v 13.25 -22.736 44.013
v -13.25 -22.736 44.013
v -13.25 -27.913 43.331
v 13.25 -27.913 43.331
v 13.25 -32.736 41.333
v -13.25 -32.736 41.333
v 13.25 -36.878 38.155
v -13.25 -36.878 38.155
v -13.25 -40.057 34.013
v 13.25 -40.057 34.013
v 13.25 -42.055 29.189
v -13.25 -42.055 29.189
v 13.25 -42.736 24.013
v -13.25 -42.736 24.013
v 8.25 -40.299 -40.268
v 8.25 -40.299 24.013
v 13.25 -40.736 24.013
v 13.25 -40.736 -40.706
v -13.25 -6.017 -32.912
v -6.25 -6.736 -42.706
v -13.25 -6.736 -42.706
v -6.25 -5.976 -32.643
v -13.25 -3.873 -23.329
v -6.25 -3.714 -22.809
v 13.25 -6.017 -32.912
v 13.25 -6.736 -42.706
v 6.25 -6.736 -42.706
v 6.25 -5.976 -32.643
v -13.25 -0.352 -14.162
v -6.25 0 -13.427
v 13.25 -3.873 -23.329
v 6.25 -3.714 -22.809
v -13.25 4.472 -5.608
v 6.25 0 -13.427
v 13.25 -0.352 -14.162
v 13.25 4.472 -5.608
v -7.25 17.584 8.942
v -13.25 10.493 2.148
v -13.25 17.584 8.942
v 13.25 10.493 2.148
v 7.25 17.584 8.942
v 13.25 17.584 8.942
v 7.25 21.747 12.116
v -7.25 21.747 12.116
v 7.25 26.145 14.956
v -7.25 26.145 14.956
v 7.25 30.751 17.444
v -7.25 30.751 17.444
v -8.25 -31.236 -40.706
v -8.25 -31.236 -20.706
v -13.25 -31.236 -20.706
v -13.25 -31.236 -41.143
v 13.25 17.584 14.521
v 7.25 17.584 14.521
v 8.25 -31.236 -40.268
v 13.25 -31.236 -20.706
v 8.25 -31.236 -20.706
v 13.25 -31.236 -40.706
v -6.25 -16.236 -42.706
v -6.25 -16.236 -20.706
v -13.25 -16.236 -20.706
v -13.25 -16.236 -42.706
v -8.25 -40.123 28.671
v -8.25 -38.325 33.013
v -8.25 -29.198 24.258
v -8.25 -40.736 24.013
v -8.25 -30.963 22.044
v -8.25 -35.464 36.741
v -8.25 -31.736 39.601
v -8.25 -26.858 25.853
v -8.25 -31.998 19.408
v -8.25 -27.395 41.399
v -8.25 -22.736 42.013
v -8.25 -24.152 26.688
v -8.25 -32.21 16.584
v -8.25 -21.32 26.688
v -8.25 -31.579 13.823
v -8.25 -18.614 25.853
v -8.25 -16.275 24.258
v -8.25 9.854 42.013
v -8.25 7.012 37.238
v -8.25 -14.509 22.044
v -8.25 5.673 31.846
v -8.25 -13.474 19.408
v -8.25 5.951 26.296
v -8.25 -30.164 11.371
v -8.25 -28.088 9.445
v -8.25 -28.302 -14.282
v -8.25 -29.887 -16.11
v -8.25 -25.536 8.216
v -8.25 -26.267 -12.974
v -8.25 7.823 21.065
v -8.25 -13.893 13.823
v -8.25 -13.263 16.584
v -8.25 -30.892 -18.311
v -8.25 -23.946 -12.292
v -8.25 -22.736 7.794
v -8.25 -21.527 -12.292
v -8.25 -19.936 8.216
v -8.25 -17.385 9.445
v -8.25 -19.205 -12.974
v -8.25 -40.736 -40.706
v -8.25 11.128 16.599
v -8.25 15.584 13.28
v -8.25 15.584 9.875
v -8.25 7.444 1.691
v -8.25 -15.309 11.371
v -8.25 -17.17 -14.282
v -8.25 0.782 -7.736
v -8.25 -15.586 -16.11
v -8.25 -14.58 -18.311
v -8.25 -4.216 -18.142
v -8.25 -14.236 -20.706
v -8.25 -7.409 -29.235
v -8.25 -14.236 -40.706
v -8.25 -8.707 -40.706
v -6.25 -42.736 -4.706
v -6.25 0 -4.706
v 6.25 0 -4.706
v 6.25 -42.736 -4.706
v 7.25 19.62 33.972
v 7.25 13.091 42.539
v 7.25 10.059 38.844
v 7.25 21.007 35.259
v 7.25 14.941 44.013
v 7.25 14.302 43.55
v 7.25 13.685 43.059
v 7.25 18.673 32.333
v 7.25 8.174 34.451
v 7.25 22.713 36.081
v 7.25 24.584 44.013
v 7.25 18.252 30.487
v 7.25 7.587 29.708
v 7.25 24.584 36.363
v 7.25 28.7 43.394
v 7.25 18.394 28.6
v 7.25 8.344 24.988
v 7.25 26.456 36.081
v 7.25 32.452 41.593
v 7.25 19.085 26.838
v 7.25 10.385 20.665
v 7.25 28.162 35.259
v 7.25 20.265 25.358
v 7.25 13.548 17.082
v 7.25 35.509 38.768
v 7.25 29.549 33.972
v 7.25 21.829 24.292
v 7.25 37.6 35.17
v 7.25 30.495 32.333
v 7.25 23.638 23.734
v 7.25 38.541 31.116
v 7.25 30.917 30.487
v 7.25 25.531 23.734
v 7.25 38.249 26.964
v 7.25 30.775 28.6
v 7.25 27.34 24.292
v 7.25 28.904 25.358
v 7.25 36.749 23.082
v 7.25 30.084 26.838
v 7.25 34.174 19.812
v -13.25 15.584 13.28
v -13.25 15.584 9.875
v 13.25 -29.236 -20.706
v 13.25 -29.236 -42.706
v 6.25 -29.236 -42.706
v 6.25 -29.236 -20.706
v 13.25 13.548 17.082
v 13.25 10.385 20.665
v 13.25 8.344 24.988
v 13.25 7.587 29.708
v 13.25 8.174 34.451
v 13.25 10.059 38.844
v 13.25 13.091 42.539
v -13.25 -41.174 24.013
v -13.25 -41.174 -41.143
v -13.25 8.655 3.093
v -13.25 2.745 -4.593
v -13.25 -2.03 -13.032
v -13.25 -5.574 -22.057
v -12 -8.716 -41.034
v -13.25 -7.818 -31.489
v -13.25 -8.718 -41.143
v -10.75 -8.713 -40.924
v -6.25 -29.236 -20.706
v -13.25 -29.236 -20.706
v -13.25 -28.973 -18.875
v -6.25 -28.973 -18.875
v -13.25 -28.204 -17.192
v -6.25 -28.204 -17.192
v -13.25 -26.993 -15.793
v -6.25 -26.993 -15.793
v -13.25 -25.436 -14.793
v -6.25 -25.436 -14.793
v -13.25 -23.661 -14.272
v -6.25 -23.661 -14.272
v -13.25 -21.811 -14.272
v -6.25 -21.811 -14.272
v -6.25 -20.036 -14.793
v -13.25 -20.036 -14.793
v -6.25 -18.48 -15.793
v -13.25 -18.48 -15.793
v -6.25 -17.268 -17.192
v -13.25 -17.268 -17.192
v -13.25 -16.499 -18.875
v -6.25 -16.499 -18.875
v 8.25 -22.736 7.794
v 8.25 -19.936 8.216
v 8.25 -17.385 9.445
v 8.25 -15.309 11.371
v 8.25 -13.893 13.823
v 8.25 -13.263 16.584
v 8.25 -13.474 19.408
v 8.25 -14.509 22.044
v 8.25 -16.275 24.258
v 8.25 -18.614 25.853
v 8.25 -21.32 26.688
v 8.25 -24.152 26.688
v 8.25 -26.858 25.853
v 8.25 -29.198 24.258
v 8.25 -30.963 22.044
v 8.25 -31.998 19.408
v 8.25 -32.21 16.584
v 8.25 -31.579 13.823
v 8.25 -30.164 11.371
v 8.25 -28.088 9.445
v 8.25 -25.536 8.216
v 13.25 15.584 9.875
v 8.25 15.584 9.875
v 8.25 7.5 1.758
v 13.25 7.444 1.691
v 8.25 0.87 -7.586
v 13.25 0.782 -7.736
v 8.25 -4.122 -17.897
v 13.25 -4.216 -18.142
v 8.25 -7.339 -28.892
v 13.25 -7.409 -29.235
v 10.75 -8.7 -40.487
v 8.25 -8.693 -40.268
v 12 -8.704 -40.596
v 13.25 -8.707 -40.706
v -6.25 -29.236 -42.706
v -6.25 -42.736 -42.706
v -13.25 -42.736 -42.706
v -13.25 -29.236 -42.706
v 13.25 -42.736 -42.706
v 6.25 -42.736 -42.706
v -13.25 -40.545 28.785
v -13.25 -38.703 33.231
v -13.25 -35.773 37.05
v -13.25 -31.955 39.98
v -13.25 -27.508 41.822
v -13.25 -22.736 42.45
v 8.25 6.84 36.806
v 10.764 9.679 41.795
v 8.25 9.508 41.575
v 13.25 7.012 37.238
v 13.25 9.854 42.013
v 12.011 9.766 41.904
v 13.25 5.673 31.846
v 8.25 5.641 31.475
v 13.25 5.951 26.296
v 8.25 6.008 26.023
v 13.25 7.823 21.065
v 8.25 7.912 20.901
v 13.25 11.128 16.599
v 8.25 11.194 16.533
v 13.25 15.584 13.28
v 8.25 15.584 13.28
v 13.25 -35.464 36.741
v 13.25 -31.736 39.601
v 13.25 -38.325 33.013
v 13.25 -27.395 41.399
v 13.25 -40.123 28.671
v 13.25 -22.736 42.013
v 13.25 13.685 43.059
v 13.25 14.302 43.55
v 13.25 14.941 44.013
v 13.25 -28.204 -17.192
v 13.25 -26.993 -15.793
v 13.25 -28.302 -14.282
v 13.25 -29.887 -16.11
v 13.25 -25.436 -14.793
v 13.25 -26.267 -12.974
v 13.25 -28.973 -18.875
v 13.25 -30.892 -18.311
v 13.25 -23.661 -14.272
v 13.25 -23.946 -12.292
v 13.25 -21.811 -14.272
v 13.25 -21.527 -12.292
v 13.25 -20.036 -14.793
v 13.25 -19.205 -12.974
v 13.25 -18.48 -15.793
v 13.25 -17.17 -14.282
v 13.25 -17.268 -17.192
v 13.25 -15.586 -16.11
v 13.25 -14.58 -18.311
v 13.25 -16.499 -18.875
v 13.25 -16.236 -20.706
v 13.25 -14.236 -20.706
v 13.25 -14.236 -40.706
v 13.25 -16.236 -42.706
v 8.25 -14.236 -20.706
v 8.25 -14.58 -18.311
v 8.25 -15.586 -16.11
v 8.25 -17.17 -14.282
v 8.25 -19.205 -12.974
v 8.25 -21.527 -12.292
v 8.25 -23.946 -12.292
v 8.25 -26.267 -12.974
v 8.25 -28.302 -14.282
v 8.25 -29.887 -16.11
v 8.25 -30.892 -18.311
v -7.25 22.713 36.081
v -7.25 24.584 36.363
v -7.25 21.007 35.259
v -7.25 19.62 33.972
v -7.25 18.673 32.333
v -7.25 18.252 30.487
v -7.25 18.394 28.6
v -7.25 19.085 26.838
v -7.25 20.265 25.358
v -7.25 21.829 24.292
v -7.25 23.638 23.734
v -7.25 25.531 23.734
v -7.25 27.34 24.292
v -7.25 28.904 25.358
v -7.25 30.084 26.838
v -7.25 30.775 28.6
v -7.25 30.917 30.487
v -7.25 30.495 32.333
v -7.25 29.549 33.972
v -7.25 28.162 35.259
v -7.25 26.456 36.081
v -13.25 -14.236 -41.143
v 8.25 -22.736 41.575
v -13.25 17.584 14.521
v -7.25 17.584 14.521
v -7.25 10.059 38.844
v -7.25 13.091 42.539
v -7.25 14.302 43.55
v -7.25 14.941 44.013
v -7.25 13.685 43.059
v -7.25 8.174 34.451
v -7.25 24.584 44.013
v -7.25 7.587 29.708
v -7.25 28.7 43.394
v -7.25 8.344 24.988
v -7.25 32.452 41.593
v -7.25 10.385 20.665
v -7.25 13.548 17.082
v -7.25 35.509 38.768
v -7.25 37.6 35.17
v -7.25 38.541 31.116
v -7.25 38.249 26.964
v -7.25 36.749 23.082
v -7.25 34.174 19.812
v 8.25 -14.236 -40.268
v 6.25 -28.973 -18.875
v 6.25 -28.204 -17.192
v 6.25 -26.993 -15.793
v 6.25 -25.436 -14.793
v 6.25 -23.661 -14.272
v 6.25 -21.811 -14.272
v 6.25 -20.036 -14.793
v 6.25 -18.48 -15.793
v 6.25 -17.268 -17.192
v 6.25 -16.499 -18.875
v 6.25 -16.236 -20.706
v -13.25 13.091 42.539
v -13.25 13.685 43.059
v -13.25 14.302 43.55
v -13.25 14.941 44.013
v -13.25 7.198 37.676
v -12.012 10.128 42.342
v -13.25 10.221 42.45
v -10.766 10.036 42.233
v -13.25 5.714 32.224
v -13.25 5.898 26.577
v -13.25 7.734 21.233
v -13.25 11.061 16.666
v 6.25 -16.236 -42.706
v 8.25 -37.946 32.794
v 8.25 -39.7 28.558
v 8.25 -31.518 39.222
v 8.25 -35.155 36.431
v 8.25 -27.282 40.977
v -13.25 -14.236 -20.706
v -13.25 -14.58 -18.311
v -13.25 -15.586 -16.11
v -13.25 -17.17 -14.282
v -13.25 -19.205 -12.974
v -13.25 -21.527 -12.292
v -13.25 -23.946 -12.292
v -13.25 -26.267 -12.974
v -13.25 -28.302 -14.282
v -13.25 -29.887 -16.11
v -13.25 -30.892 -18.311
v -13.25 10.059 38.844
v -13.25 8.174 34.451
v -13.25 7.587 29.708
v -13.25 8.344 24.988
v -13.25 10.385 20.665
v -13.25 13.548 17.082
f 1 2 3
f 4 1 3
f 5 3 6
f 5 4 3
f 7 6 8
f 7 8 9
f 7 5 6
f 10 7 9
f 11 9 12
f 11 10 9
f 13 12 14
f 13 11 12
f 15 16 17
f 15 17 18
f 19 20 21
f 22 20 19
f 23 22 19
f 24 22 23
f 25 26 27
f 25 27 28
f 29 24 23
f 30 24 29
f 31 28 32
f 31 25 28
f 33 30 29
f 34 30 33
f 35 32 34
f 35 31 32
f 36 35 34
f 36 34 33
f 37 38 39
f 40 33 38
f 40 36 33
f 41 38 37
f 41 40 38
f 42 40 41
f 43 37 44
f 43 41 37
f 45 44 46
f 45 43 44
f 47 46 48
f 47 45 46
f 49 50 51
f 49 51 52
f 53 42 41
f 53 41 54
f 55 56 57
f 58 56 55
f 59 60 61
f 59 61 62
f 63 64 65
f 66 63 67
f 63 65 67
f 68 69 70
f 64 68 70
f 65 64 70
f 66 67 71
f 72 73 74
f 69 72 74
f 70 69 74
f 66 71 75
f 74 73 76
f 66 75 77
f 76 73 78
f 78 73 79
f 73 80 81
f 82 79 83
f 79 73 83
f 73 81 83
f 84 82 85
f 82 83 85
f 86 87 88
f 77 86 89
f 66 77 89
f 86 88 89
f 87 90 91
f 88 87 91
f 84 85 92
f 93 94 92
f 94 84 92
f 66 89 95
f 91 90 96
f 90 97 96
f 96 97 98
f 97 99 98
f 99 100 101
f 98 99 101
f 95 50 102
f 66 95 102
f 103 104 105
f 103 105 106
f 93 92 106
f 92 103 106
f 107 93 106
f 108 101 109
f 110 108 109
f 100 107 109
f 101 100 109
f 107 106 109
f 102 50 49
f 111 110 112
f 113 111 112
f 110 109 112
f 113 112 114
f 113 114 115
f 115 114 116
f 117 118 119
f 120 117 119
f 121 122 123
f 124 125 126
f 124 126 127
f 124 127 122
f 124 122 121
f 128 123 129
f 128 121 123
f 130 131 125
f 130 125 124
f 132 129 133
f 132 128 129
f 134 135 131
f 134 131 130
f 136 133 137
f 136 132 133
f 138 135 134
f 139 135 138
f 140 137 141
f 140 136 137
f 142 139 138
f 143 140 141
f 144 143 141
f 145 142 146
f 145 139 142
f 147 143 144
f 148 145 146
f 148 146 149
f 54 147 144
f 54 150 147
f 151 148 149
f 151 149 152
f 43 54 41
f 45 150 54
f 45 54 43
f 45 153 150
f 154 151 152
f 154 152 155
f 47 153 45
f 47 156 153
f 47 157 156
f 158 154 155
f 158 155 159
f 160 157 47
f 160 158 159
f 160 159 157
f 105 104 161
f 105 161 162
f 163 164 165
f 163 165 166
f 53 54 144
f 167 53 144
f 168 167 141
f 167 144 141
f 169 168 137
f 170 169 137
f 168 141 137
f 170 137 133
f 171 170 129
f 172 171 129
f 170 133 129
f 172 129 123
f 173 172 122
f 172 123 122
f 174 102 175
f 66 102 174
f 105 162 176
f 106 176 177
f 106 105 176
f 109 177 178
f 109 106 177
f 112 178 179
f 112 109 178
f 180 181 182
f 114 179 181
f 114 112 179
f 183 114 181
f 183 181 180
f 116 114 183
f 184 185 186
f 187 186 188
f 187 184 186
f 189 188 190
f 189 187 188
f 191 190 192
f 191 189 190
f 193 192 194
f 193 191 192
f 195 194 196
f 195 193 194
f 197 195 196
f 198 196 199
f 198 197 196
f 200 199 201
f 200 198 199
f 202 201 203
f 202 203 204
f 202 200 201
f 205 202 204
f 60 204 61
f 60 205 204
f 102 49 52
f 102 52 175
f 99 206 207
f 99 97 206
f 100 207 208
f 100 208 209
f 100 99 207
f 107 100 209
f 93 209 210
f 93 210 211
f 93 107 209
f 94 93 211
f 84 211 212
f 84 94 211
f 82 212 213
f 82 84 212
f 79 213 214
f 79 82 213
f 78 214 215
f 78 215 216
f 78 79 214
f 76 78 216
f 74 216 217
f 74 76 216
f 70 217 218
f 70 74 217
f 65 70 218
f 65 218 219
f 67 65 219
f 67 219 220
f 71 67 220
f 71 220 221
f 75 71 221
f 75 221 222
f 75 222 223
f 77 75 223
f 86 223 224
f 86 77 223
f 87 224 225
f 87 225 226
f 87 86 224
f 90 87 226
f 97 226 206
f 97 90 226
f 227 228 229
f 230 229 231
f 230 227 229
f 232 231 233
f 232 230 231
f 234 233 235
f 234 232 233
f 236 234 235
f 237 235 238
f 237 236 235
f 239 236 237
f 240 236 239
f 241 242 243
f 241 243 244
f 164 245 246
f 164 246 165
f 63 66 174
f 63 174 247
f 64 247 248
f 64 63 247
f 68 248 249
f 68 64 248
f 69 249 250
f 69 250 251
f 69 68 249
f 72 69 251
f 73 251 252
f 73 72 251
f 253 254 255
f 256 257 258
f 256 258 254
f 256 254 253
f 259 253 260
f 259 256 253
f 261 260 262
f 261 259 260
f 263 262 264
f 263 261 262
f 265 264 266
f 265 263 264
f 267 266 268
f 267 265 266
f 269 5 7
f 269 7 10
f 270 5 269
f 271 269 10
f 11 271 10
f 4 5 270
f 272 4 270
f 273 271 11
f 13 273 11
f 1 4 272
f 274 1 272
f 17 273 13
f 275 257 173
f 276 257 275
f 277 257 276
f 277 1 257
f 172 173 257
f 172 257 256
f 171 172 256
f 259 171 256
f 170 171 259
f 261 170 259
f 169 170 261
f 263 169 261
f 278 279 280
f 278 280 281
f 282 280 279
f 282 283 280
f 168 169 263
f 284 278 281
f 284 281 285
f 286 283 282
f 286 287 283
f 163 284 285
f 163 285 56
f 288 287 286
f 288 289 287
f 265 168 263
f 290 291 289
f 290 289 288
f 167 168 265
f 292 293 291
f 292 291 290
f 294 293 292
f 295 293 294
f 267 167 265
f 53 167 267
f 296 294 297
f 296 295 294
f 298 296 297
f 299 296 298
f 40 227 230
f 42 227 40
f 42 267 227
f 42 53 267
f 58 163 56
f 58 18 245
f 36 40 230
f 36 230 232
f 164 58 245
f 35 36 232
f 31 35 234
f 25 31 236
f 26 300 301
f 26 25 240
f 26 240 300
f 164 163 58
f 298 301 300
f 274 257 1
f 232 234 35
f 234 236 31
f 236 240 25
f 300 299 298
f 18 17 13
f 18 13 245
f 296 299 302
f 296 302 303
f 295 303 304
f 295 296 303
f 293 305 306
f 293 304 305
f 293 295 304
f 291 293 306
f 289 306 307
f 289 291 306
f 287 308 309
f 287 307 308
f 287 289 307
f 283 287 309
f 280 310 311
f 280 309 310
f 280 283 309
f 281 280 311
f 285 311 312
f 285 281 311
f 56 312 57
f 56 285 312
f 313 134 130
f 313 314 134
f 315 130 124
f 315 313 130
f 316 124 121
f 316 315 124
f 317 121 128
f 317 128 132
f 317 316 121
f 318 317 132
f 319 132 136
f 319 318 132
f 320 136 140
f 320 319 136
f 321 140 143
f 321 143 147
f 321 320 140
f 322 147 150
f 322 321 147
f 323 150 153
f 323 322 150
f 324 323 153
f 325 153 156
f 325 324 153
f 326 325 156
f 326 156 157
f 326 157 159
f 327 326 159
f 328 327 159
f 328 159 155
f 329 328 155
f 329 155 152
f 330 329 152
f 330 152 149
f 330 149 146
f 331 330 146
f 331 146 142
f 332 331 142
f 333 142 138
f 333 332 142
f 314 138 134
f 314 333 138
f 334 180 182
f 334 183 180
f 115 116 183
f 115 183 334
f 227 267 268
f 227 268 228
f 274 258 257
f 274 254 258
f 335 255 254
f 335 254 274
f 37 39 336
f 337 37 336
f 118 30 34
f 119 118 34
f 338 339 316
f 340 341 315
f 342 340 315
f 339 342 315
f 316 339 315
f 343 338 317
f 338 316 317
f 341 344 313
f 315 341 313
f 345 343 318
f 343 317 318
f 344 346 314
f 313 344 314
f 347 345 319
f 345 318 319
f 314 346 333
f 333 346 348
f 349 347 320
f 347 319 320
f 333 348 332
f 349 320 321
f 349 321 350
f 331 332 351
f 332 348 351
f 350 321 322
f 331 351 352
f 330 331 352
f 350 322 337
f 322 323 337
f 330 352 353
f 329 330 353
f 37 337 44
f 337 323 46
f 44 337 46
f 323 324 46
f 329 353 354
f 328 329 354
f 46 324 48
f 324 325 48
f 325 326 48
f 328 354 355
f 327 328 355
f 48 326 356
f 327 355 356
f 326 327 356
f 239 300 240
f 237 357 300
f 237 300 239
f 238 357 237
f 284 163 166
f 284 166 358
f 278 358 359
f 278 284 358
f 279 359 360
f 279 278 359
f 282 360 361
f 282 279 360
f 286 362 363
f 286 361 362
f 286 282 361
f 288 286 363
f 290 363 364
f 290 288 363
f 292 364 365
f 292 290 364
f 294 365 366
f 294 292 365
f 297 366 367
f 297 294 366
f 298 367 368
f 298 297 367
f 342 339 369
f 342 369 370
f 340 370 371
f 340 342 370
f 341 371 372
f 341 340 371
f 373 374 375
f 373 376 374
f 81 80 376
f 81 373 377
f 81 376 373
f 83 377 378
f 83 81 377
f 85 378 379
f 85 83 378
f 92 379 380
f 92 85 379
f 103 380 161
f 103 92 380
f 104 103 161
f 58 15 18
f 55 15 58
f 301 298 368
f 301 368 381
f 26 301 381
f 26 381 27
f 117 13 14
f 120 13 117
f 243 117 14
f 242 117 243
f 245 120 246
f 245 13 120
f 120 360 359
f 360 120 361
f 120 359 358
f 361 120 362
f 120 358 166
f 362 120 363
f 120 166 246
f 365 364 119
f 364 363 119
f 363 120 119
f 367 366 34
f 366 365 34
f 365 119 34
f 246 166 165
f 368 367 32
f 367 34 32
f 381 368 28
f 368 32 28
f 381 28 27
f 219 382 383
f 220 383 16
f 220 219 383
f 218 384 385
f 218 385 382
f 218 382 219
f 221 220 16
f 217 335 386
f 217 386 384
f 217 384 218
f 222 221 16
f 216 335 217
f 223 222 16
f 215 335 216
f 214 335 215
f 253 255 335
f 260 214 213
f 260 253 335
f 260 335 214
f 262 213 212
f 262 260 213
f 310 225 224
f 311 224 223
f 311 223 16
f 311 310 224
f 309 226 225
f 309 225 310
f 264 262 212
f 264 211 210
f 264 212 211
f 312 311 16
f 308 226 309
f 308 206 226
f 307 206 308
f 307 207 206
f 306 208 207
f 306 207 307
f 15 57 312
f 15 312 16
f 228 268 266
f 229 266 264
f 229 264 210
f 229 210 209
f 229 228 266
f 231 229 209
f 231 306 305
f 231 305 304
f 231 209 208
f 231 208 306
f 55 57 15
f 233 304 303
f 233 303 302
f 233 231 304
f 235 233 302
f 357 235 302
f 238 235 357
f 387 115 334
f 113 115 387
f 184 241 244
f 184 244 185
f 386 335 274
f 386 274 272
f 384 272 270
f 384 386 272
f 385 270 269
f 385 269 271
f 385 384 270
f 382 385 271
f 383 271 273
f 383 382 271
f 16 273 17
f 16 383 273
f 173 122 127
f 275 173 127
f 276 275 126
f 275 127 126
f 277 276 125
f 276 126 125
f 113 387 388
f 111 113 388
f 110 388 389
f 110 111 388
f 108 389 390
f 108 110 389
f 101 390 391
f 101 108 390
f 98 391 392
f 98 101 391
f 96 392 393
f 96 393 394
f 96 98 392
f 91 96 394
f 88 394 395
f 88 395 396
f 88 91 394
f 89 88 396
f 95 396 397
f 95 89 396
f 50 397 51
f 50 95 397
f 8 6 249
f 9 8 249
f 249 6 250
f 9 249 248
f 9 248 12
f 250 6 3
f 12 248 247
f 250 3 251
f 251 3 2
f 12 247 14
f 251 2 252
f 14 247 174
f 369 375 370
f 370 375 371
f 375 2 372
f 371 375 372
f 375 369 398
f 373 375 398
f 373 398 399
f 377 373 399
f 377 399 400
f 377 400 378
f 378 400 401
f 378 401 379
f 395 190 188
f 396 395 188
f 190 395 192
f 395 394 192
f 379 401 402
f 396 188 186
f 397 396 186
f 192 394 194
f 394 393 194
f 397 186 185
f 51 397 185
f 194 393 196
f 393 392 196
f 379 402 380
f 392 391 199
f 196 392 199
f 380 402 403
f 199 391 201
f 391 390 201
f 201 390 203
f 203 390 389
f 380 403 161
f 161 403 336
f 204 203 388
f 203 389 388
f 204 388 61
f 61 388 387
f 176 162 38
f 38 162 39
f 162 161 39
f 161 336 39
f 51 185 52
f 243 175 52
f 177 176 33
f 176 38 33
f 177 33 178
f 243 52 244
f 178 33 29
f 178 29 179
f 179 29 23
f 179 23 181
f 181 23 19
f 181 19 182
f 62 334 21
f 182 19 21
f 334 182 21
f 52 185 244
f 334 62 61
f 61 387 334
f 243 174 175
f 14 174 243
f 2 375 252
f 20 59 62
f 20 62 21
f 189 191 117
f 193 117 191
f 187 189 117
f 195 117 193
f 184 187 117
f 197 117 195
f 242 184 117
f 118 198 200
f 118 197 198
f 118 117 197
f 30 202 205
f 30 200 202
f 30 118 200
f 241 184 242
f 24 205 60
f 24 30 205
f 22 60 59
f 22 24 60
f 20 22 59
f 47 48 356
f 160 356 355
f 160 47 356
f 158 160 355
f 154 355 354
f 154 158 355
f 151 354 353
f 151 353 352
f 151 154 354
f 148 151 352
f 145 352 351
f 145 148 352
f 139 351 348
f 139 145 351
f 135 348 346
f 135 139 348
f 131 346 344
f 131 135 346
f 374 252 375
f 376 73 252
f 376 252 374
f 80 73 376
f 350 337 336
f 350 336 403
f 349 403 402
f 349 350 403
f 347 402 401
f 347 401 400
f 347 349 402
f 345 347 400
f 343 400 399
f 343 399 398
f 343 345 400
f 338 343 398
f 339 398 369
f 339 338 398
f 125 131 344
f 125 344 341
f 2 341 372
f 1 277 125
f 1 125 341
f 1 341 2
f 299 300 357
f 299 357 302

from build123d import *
from OCP.BRepFilletAPI import BRepFilletAPI_MakeChamfer

# Parameters (mm, degrees)
SKETCH2_R           = 6.35
BOSS_EXTRUDE1_DEPTH = 7.25
BOSS_EXTRUDE2_DEPTH = 13.25
SKETCH2_4_R         = 9.5
BOSS_EXTRUDE3_DEPTH = 8.25
CHAMFER1_SIZE       = 0.437443318
CHAMFER1_SIZE_2     = 5
SKETCH3_W           = 12.5
SKETCH3_H           = 38
CUT_EXTRUDE1_DEPTH  = 50


with BuildPart() as part:
    # Sketch2 → Boss-Extrude1 (new, symmetric)
    with BuildSketch(Plane(origin=(0, 0, 0), x_dir=(0, 0, -1), z_dir=(1, 0, 0))):
        with BuildLine():
            ThreePointArc((-17.444074423, 30.751237722), (-33.17807799, 38.221892264), (-44.012704688, 24.584428722))
            Line((-44.012704688, 24.584428722), (-44.012704688, 14.940777961))
            ThreePointArc((-44.012704688, 14.940777961), (-43.308060102, 13.990396231), (-42.539020478, 13.091325888))
            ThreePointArc((-42.539020478, 13.091325888), (-27.32091807, 7.798890756), (-14.520771303, 17.584428722))
            Line((-14.520771303, 17.584428722), (-8.941749337, 17.584428722))
            ThreePointArc((-8.941749337, 17.584428722), (-13.579253126, 23.918357524), (-17.444074423, 30.751237722))
        make_face()
        with Locations(Location((-30.012704688, 24.584428722, 0), (0, 0, 180))):
            Circle(SKETCH2_R, mode=Mode.SUBTRACT)
    extrude(amount=BOSS_EXTRUDE1_DEPTH, both=True)

    # Sketch2<3> → Boss-Extrude2 (add, symmetric)
    with BuildSketch(Plane(origin=(0, 0, 0), x_dir=(0, 0, -1), z_dir=(1, 0, 0))):
        with BuildLine():
            ThreePointArc((-42.539020478, 13.091325888), (-43.308060102, 13.990396231), (-44.012704688, 14.940777961))
            Line((-44.012704688, 14.940777961), (-44.012704688, -22.736176348))
            ThreePointArc((-44.012704688, -22.736176348), (-38.154840312, -36.878311972), (-24.012704688, -42.736176348))
            Line((-24.012704688, -42.736176348), (42.705798991, -42.736176348))
            Line((42.705798991, -42.736176348), (42.705798991, -29.236176348))
            Line((42.705798991, -29.236176348), (20.705798991, -29.236176348))
            ThreePointArc((20.705798991, -29.236176348), (14.205798991, -22.736176348), (20.705798991, -16.236176348))
            Line((20.705798991, -16.236176348), (42.705798991, -16.236176348))
            Line((42.705798991, -16.236176348), (42.705798991, -6.736176348))
            ThreePointArc((42.705798991, -6.736176348), (14.162143482, -0.351848663), (-8.941749337, 17.584428722))
            Line((-8.941749337, 17.584428722), (-14.520771303, 17.584428722))
            ThreePointArc((-14.520771303, 17.584428722), (-27.32091807, 7.798890756), (-42.539020478, 13.091325888))
        make_face()
        with BuildLine():
            ThreePointArc((-42.012704688, 9.853508859), (-26.296300857, 5.951438018), (-13.279504157, 15.584428722))
            Line((-13.279504157, 15.584428722), (-9.875106941, 15.584428722))
            ThreePointArc((-9.875106941, 15.584428722), (12.834584681, -1.93513579), (40.705798991, -8.70718475))
            Line((40.705798991, -8.70718475), (40.705798991, -14.236176348))
            Line((40.705798991, -14.236176348), (20.705798991, -14.236176348))
            ThreePointArc((20.705798991, -14.236176348), (12.205798991, -22.736176348), (20.705798991, -31.236176348))
            Line((20.705798991, -31.236176348), (40.705798991, -31.236176348))
            Line((40.705798991, -31.236176348), (40.705798991, -40.736176348))
            Line((40.705798991, -40.736176348), (-24.012704688, -40.736176348))
            ThreePointArc((-24.012704688, -40.736176348), (-36.74062675, -35.464098409), (-42.012704688, -22.736176348))
            Line((-42.012704688, -22.736176348), (-42.012704688, 9.853508859))
        make_face(mode=Mode.SUBTRACT)
    extrude(amount=BOSS_EXTRUDE2_DEPTH, both=True)

    # Sketch2<4> → Boss-Extrude3 (add, symmetric)
    with BuildSketch(Plane(origin=(0, 0, 0), x_dir=(0, 0, -1), z_dir=(1, 0, 0))):
        with BuildLine():
            Line((-42.012704688, 9.853508859), (-42.012704688, -22.736176348))
            ThreePointArc((-42.012704688, -22.736176348), (-36.74062675, -35.464098409), (-24.012704688, -40.736176348))
            Line((-24.012704688, -40.736176348), (40.705798991, -40.736176348))
            Line((40.705798991, -40.736176348), (40.705798991, -31.236176348))
            Line((40.705798991, -31.236176348), (20.705798991, -31.236176348))
            ThreePointArc((20.705798991, -31.236176348), (12.205798991, -22.736176348), (20.705798991, -14.236176348))
            Line((20.705798991, -14.236176348), (40.705798991, -14.236176348))
            Line((40.705798991, -14.236176348), (40.705798991, -8.70718475))
            ThreePointArc((40.705798991, -8.70718475), (12.834584681, -1.93513579), (-9.875106941, 15.584428722))
            Line((-9.875106941, 15.584428722), (-13.279504157, 15.584428722))
            ThreePointArc((-13.279504157, 15.584428722), (-26.296300857, 5.951438018), (-42.012704688, 9.853508859))
        make_face()
        with Locations((-17.294201009, -22.736176348)):
            Circle(SKETCH2_4_R, mode=Mode.SUBTRACT)
    extrude(amount=BOSS_EXTRUDE3_DEPTH, both=True)

    # Chamfer1
    chamfer1_edges_1 = [part.edges().sort_by_distance(p)[0] for p in [
        (-13.25, -40.736176348, -8.346547152),
    ]]
    chamfer1_side_1 = [part.faces().sort_by_distance(p)[0] for p in [
        (-13.25, -40.744925214, -8.346547152),
    ]]
    chamfer1_edges_2 = [part.edges().sort_by_distance(p)[0] for p in [
        (-13.25, -35.464098409, 36.74062675),
    ]]
    chamfer1_side_2 = [part.faces().sort_by_distance(p)[0] for p in [
        (-13.25, -35.470284792, 36.746813132),
    ]]
    chamfer1_edges_3 = [part.edges().sort_by_distance(p)[0] for p in [
        (-13.25, -6.441333744, 42.012704688),
    ]]
    chamfer1_side_3 = [part.faces().sort_by_distance(p)[0] for p in [
        (-13.25, -6.441333744, 42.021453555),
    ]]
    chamfer1_edges_4 = [part.edges().sort_by_distance(p)[0] for p in [
        (8.25, -40.736176348, -8.346547152),
    ]]
    chamfer1_side_4 = [part.faces().sort_by_distance(p)[0] for p in [
        (8.258748866, -40.736176348, -8.346547152),
    ]]
    chamfer1_edges_5 = [part.edges().sort_by_distance(p)[0] for p in [
        (8.25, -35.464098409, 36.74062675),
    ]]
    chamfer1_side_5 = [part.faces().sort_by_distance(p)[0] for p in [
        (8.258748866, -35.464098409, 36.74062675),
    ]]
    chamfer1_edges_6 = [part.edges().sort_by_distance(p)[0] for p in [
        (8.25, -6.441333744, 42.012704688),
    ]]
    chamfer1_side_6 = [part.faces().sort_by_distance(p)[0] for p in [
        (8.258748866, -6.441333744, 42.012704688),
    ]]
    chamfer1_edges_7 = [part.edges().sort_by_distance(p)[0] for p in [
        (-13.25, -35.986176348, -40.705798991),
    ]]
    chamfer1_side_7 = [part.faces().sort_by_distance(p)[0] for p in [
        (-13.25, -35.986176348, -40.714547858),
    ]]
    chamfer1_edges_8 = [part.edges().sort_by_distance(p)[0] for p in [
        (-13.25, -11.471680549, -40.705798991),
    ]]
    chamfer1_side_8 = [part.faces().sort_by_distance(p)[0] for p in [
        (-13.25, -11.471680549, -40.714547858),
    ]]
    chamfer1_edges_9 = [part.edges().sort_by_distance(p)[0] for p in [
        (8.25, -35.986176348, -40.705798991),
    ]]
    chamfer1_side_9 = [part.faces().sort_by_distance(p)[0] for p in [
        (8.258748866, -35.986176348, -40.705798991),
    ]]
    chamfer1_edges_10 = [part.edges().sort_by_distance(p)[0] for p in [
        (8.25, -11.471680549, -40.705798991),
    ]]
    chamfer1_side_10 = [part.faces().sort_by_distance(p)[0] for p in [
        (8.258748866, -11.471680549, -40.705798991),
    ]]
    chamfer1 = BRepFilletAPI_MakeChamfer(part.part.solid().wrapped)
    for e in chamfer1_edges_1:
        chamfer1.Add(CHAMFER1_SIZE - 0.0001, CHAMFER1_SIZE_2 - 0.0001, e.wrapped, chamfer1_side_1[0].wrapped)
    for e in chamfer1_edges_2:
        chamfer1.Add(CHAMFER1_SIZE - 0.0001, CHAMFER1_SIZE_2 - 0.0001, e.wrapped, chamfer1_side_2[0].wrapped)
    for e in chamfer1_edges_3:
        chamfer1.Add(CHAMFER1_SIZE - 0.0001, CHAMFER1_SIZE_2 - 0.0001, e.wrapped, chamfer1_side_3[0].wrapped)
    for e in chamfer1_edges_4:
        chamfer1.Add(CHAMFER1_SIZE_2 - 0.0001, CHAMFER1_SIZE - 0.0001, e.wrapped, chamfer1_side_4[0].wrapped)
    for e in chamfer1_edges_5:
        chamfer1.Add(CHAMFER1_SIZE_2 - 0.0001, CHAMFER1_SIZE - 0.0001, e.wrapped, chamfer1_side_5[0].wrapped)
    for e in chamfer1_edges_6:
        chamfer1.Add(CHAMFER1_SIZE_2 - 0.0001, CHAMFER1_SIZE - 0.0001, e.wrapped, chamfer1_side_6[0].wrapped)
    for e in chamfer1_edges_7:
        chamfer1.Add(CHAMFER1_SIZE - 0.0001, CHAMFER1_SIZE_2 - 0.0001, e.wrapped, chamfer1_side_7[0].wrapped)
    for e in chamfer1_edges_8:
        chamfer1.Add(CHAMFER1_SIZE - 0.0001, CHAMFER1_SIZE_2 - 0.0001, e.wrapped, chamfer1_side_8[0].wrapped)
    for e in chamfer1_edges_9:
        chamfer1.Add(CHAMFER1_SIZE_2 - 0.0001, CHAMFER1_SIZE - 0.0001, e.wrapped, chamfer1_side_9[0].wrapped)
    for e in chamfer1_edges_10:
        chamfer1.Add(CHAMFER1_SIZE_2 - 0.0001, CHAMFER1_SIZE - 0.0001, e.wrapped, chamfer1_side_10[0].wrapped)
    add(Compound.cast(chamfer1.Shape()), mode=Mode.REPLACE)  # a hair under: the kernel refuses the full size

    # Sketch3 → Cut-Extrude1 (cut)
    with BuildSketch(Plane(origin=(0, 0, 0), x_dir=(1, 0, 0), z_dir=(0, 1, 0))):
        with Locations((0, 23.705798991)):
            Rectangle(SKETCH3_W, SKETCH3_H)
    extrude(amount=-CUT_EXTRUDE1_DEPTH, mode=Mode.SUBTRACT)


solid = part.part
